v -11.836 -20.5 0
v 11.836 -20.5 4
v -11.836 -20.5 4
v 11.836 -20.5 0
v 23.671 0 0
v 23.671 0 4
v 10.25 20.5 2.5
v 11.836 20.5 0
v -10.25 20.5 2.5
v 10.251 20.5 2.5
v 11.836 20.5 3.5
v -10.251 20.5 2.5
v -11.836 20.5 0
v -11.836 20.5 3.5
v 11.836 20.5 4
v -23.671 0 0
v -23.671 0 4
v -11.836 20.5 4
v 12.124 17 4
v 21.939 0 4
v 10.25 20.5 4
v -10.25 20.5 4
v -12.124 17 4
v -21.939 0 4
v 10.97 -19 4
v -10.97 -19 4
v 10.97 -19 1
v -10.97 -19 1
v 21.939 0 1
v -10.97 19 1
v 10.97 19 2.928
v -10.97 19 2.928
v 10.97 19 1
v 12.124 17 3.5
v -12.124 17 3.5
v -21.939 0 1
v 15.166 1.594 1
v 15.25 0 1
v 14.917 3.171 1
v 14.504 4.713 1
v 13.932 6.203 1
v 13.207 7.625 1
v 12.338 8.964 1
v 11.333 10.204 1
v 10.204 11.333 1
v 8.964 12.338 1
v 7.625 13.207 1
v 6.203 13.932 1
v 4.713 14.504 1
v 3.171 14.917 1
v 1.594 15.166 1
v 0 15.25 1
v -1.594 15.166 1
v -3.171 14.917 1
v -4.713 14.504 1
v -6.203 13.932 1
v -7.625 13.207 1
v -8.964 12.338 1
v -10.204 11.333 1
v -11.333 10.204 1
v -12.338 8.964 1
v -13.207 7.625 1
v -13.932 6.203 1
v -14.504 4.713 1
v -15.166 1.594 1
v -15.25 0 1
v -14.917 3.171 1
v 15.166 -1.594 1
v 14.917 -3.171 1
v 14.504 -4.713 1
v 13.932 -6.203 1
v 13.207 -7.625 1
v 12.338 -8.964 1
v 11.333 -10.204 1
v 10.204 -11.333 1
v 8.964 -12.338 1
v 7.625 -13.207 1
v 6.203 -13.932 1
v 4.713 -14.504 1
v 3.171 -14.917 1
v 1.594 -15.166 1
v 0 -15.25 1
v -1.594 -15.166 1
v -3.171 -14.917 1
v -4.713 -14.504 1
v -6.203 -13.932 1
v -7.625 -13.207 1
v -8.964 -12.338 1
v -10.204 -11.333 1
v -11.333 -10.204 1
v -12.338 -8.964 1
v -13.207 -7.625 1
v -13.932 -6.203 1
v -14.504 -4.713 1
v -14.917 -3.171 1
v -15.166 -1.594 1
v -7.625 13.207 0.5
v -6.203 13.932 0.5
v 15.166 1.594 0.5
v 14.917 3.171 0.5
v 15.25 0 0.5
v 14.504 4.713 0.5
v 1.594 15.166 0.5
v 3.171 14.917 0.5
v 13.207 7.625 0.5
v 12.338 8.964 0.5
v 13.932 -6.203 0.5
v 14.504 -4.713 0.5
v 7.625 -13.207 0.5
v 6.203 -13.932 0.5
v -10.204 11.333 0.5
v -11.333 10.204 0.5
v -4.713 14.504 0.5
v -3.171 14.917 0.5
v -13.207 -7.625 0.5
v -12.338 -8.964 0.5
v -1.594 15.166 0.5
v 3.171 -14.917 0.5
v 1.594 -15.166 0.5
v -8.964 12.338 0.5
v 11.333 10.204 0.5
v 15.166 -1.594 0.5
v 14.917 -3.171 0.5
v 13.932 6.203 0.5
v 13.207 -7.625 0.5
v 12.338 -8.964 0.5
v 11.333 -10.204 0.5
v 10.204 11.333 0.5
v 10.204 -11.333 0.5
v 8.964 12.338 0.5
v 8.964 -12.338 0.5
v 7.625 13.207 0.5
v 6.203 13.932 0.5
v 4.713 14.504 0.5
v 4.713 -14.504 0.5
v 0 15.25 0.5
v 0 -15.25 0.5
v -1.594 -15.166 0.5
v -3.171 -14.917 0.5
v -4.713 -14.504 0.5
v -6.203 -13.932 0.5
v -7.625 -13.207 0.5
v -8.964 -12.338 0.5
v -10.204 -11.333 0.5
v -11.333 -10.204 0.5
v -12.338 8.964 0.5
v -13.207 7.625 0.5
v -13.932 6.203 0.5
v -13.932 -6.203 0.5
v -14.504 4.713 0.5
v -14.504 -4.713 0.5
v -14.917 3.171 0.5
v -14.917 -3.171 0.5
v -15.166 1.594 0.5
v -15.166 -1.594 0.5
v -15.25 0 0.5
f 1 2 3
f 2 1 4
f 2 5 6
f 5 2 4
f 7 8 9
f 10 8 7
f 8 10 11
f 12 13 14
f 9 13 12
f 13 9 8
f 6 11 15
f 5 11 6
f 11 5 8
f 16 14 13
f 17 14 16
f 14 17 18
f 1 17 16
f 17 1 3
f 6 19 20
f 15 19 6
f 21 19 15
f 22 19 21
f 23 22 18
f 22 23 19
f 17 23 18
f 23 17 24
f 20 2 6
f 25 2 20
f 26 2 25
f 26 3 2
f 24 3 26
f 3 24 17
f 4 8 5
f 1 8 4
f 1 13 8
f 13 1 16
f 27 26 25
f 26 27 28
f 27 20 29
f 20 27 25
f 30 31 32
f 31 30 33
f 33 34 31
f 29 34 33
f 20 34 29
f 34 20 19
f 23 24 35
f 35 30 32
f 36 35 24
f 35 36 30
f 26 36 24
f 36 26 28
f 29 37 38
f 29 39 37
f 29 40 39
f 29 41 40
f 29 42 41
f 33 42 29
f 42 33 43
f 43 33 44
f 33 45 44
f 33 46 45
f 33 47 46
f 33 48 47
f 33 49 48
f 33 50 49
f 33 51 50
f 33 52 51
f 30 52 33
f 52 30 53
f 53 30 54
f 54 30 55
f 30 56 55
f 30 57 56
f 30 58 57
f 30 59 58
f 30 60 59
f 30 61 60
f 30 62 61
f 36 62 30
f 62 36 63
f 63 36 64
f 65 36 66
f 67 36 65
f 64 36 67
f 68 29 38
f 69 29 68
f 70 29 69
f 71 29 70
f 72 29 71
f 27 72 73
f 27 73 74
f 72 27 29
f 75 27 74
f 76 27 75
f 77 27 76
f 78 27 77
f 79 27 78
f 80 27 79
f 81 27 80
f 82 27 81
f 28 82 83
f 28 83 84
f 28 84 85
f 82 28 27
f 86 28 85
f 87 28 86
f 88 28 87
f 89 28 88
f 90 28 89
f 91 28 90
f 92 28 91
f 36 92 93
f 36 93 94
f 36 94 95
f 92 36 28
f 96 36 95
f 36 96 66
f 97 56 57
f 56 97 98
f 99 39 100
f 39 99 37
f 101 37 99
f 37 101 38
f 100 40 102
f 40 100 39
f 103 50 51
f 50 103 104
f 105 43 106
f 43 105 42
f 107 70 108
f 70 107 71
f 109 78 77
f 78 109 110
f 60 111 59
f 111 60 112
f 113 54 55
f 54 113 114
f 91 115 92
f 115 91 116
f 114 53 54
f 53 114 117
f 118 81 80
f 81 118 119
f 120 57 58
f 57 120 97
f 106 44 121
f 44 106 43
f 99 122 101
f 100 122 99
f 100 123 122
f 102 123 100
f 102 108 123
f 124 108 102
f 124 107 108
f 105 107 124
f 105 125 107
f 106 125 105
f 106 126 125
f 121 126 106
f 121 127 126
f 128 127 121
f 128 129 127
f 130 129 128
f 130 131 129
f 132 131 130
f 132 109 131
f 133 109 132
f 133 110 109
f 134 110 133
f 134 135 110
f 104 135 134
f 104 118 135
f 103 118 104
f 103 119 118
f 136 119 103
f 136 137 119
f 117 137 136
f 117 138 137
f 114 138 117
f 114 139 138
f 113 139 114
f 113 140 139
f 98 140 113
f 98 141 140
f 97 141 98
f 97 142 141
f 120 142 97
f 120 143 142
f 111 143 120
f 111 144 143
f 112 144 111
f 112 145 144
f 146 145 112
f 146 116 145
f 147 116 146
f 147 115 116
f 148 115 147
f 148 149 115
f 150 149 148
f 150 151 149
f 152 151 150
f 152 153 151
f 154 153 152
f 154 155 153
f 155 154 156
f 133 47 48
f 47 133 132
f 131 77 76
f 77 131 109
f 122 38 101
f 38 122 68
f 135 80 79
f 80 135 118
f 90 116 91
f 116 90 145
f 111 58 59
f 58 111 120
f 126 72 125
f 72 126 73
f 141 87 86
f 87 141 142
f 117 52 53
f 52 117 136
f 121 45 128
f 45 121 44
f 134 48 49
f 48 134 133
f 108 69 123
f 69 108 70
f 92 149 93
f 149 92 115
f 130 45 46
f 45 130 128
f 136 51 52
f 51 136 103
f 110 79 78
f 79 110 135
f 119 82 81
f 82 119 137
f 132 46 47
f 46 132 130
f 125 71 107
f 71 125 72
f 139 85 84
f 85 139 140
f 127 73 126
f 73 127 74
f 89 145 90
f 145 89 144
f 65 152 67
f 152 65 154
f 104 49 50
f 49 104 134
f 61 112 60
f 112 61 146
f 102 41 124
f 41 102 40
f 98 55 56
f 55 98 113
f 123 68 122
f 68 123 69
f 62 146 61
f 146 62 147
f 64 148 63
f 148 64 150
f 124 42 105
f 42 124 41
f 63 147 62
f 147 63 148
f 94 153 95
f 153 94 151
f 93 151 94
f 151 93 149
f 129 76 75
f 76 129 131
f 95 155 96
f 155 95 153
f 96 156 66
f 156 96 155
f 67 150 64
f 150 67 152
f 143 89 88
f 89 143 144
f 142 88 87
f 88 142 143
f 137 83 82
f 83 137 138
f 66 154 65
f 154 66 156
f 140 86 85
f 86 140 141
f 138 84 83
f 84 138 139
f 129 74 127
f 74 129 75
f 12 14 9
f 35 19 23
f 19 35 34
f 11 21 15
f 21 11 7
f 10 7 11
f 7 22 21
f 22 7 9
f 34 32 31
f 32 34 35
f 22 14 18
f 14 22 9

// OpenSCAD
//=============================================================================
// nespresso-honeycomb.scad
//
// a parametric honeycomb-shaped holder for nespresso pods
//=============================================================================
// Written in 2018 by Patrick Barrett
//
// To the extent possible under law, the author(s) have dedicated all copyright
// and related and neighboring rights to this work to the public domain
// worldwide. This work is distributed without any warranty.
//
// See <http://creativecommons.org/publicdomain/zero/1.0/> for full dedication.
//=============================================================================


// dimensions
x = 1; // cell count, vertical, odd numbers only
y = 2; // cell count, horizontal, odd numbers only

shape = "hexagon"; // [hexagon|rectangle], overall shape

di = 38; // mm, main pod well indiameter
pod_well = 1.5; // mm, main pod well depth

blg_well = 0.5; // mm, buldge well depth
blg_dia = 30.5; // mm, buldge well depth

mag_well = -.1; // mm, magnet well depth
mag_dia = 4.2; // mm, magnet diameter
mag_on_back = true; // magnet on back face (true) or front face (false)

lip_length = 2; // mm, top edge holder lip extension from edge
lip_depth = 0.5; // mm, top edge holder lip thickness
lip_angle_offset = 1; // mm, top edge holder lip angle offset

cell_wall = 3; // mm, cell side wall size
mag_wall = 0.6; // mm, magnet backing wall minimum size

// customizable variables end here

abit = 0.001; //use for making overlap to get single manifold stl
alot = 150;

$fn = 60;

Di = di * (2/sqrt(3)); // mm, circumdiameter of inner side of honeycomb

do = di + (2*cell_wall); // mm, inradius of outter side of honeycomb
Do = do * (2/sqrt(3)); // mm, circumdiameter of outter side of honeycomb

dm = (di+do)/2; // mm, inradius of median of honeycomb
Dm = (Di+Do)/2; // mm, circumdiameter of median of honeycomb

total_body_depth = mag_wall + mag_well + blg_well
                 + pod_well + lip_depth + lip_angle_offset;
max_back_depth = mag_wall + mag_well + blg_well;

x_min = -floor(x/2);
x_max = floor(x/2);
y_min = -floor(y/2);
y_max = floor(y/2);

// each pod cell
module cell() {
            DD=(di + cell_wall)*2/sqrt(3);
    difference() {
    union() {
        difference() {
            cylinder(d = DD, h = total_body_depth, $fn = 6);
            
            // main hex cut
            translate([0,0,max_back_depth])
            cylinder(d = Di, h = alot, $fn = 6);
            
            // buldge cut
            translate([0,0,max_back_depth-blg_well])
            cylinder(d = blg_dia, h = alot);
            
            // magnet cut
            if (mag_on_back) {
                for(i=[0:5]){
                    translate([sin(360*i/6)*Dm/4,
                               cos(360*i/6)*Dm/4,
                               -alot+mag_well])
                    cylinder(d = mag_dia, h = alot);
                }
            } else {
                for(i=[0:5]){
                    translate([sin(360*i/6)*Dm/4,
                               cos(360*i/6)*Dm/4,
                               mag_wall])
                    cylinder(d = mag_dia, h = alot);
                }
            }
        }
        
        // add lip
        hull() {
            difference() {
                translate([0,0,total_body_depth - lip_depth])
                cylinder(d = DD, h = lip_depth, $fn = 6);
                translate([0,-alot/2 + di/2 - lip_length,0])
                cube([alot, alot, alot], center = true);
            }
            
            translate([0,
                       dm/2,
                       (lip_depth + lip_angle_offset)/2
                       + (total_body_depth - lip_depth - lip_angle_offset)])
            cube([dm/2, abit, lip_depth+lip_angle_offset], center=true);
        }
    }
%        for(a=[30:60:360-1]) {
            rotate(a,[0,0,1]){
                translate([DD*sqrt(3)/2/2,0,0]) {
                    cube([cell_wall+abit,10,4*lip_depth+abit],center=true);
                    cube([cell_wall/2-abit,10,2*lip_depth+abit],center=true);
                }
            }
        }
    }
}

// main body
if(false)
union() {
    for(i = [x_min:x_max]){
        for(j=[ for (jj=[y_min:y_max]) jj+(0.5 * abs(i%2))]){
            // ^^^ adds 0.5 to odd cols ^^^
            hide = (shape != "hexagon")
            ? j == y_max && i%2 != 0
            : abs(j) > -0.5*(abs(i)) + (y_max - 0.5 * min(0, y_max-x_max))
              || abs(j) > y_max;
            
            if (!hide) {
                x = i * (dm * sqrt(3)/2);
                y = j * dm;
                translate([x,y,0])
                cell();
            }
        }
    }
}


//cube([220,220,1],center=true);

//echo (dm);


mode="i1";

module part(g) {
    union() {
    for(y=[0:len(g)-1]){
        r=g[y];
        for(x=[0:len(r)-1]){
//            translate([x*sqrt(3)/2,(x/2+y)*sqrt(3)/2,0]*dm)
            if(r[x]==1) {
//                o=(x%2)==0 ? 0 : .5;
                o=x/2;
                translate([x*sqrt(3)/2,o-y,0]*dm)
                cell();
            }
        }
    }
}
}

if(mode=="preview") {

part([
    [1,1,1,1,1,1],
    [1],
    [0,1],
    [1,0,1,1,1],
    [0,1,1],
    [0,1,1],
    ]);
}
if(mode=="i1"){
    part([[1]]);
}
if(mode=="y1"){
    part([[0,0,1],[0,1,1],[0,0,0,1]]);
}
if(mode=="y2"){
    part([[0,1],[0,0,1,1],[0,0,1,0]]);
}
if(mode=="c1"){
    part([[1,1],[0,1]]);
}
if(mode=="c2"){
    part([[0,1],[0,1,1]]);
}
